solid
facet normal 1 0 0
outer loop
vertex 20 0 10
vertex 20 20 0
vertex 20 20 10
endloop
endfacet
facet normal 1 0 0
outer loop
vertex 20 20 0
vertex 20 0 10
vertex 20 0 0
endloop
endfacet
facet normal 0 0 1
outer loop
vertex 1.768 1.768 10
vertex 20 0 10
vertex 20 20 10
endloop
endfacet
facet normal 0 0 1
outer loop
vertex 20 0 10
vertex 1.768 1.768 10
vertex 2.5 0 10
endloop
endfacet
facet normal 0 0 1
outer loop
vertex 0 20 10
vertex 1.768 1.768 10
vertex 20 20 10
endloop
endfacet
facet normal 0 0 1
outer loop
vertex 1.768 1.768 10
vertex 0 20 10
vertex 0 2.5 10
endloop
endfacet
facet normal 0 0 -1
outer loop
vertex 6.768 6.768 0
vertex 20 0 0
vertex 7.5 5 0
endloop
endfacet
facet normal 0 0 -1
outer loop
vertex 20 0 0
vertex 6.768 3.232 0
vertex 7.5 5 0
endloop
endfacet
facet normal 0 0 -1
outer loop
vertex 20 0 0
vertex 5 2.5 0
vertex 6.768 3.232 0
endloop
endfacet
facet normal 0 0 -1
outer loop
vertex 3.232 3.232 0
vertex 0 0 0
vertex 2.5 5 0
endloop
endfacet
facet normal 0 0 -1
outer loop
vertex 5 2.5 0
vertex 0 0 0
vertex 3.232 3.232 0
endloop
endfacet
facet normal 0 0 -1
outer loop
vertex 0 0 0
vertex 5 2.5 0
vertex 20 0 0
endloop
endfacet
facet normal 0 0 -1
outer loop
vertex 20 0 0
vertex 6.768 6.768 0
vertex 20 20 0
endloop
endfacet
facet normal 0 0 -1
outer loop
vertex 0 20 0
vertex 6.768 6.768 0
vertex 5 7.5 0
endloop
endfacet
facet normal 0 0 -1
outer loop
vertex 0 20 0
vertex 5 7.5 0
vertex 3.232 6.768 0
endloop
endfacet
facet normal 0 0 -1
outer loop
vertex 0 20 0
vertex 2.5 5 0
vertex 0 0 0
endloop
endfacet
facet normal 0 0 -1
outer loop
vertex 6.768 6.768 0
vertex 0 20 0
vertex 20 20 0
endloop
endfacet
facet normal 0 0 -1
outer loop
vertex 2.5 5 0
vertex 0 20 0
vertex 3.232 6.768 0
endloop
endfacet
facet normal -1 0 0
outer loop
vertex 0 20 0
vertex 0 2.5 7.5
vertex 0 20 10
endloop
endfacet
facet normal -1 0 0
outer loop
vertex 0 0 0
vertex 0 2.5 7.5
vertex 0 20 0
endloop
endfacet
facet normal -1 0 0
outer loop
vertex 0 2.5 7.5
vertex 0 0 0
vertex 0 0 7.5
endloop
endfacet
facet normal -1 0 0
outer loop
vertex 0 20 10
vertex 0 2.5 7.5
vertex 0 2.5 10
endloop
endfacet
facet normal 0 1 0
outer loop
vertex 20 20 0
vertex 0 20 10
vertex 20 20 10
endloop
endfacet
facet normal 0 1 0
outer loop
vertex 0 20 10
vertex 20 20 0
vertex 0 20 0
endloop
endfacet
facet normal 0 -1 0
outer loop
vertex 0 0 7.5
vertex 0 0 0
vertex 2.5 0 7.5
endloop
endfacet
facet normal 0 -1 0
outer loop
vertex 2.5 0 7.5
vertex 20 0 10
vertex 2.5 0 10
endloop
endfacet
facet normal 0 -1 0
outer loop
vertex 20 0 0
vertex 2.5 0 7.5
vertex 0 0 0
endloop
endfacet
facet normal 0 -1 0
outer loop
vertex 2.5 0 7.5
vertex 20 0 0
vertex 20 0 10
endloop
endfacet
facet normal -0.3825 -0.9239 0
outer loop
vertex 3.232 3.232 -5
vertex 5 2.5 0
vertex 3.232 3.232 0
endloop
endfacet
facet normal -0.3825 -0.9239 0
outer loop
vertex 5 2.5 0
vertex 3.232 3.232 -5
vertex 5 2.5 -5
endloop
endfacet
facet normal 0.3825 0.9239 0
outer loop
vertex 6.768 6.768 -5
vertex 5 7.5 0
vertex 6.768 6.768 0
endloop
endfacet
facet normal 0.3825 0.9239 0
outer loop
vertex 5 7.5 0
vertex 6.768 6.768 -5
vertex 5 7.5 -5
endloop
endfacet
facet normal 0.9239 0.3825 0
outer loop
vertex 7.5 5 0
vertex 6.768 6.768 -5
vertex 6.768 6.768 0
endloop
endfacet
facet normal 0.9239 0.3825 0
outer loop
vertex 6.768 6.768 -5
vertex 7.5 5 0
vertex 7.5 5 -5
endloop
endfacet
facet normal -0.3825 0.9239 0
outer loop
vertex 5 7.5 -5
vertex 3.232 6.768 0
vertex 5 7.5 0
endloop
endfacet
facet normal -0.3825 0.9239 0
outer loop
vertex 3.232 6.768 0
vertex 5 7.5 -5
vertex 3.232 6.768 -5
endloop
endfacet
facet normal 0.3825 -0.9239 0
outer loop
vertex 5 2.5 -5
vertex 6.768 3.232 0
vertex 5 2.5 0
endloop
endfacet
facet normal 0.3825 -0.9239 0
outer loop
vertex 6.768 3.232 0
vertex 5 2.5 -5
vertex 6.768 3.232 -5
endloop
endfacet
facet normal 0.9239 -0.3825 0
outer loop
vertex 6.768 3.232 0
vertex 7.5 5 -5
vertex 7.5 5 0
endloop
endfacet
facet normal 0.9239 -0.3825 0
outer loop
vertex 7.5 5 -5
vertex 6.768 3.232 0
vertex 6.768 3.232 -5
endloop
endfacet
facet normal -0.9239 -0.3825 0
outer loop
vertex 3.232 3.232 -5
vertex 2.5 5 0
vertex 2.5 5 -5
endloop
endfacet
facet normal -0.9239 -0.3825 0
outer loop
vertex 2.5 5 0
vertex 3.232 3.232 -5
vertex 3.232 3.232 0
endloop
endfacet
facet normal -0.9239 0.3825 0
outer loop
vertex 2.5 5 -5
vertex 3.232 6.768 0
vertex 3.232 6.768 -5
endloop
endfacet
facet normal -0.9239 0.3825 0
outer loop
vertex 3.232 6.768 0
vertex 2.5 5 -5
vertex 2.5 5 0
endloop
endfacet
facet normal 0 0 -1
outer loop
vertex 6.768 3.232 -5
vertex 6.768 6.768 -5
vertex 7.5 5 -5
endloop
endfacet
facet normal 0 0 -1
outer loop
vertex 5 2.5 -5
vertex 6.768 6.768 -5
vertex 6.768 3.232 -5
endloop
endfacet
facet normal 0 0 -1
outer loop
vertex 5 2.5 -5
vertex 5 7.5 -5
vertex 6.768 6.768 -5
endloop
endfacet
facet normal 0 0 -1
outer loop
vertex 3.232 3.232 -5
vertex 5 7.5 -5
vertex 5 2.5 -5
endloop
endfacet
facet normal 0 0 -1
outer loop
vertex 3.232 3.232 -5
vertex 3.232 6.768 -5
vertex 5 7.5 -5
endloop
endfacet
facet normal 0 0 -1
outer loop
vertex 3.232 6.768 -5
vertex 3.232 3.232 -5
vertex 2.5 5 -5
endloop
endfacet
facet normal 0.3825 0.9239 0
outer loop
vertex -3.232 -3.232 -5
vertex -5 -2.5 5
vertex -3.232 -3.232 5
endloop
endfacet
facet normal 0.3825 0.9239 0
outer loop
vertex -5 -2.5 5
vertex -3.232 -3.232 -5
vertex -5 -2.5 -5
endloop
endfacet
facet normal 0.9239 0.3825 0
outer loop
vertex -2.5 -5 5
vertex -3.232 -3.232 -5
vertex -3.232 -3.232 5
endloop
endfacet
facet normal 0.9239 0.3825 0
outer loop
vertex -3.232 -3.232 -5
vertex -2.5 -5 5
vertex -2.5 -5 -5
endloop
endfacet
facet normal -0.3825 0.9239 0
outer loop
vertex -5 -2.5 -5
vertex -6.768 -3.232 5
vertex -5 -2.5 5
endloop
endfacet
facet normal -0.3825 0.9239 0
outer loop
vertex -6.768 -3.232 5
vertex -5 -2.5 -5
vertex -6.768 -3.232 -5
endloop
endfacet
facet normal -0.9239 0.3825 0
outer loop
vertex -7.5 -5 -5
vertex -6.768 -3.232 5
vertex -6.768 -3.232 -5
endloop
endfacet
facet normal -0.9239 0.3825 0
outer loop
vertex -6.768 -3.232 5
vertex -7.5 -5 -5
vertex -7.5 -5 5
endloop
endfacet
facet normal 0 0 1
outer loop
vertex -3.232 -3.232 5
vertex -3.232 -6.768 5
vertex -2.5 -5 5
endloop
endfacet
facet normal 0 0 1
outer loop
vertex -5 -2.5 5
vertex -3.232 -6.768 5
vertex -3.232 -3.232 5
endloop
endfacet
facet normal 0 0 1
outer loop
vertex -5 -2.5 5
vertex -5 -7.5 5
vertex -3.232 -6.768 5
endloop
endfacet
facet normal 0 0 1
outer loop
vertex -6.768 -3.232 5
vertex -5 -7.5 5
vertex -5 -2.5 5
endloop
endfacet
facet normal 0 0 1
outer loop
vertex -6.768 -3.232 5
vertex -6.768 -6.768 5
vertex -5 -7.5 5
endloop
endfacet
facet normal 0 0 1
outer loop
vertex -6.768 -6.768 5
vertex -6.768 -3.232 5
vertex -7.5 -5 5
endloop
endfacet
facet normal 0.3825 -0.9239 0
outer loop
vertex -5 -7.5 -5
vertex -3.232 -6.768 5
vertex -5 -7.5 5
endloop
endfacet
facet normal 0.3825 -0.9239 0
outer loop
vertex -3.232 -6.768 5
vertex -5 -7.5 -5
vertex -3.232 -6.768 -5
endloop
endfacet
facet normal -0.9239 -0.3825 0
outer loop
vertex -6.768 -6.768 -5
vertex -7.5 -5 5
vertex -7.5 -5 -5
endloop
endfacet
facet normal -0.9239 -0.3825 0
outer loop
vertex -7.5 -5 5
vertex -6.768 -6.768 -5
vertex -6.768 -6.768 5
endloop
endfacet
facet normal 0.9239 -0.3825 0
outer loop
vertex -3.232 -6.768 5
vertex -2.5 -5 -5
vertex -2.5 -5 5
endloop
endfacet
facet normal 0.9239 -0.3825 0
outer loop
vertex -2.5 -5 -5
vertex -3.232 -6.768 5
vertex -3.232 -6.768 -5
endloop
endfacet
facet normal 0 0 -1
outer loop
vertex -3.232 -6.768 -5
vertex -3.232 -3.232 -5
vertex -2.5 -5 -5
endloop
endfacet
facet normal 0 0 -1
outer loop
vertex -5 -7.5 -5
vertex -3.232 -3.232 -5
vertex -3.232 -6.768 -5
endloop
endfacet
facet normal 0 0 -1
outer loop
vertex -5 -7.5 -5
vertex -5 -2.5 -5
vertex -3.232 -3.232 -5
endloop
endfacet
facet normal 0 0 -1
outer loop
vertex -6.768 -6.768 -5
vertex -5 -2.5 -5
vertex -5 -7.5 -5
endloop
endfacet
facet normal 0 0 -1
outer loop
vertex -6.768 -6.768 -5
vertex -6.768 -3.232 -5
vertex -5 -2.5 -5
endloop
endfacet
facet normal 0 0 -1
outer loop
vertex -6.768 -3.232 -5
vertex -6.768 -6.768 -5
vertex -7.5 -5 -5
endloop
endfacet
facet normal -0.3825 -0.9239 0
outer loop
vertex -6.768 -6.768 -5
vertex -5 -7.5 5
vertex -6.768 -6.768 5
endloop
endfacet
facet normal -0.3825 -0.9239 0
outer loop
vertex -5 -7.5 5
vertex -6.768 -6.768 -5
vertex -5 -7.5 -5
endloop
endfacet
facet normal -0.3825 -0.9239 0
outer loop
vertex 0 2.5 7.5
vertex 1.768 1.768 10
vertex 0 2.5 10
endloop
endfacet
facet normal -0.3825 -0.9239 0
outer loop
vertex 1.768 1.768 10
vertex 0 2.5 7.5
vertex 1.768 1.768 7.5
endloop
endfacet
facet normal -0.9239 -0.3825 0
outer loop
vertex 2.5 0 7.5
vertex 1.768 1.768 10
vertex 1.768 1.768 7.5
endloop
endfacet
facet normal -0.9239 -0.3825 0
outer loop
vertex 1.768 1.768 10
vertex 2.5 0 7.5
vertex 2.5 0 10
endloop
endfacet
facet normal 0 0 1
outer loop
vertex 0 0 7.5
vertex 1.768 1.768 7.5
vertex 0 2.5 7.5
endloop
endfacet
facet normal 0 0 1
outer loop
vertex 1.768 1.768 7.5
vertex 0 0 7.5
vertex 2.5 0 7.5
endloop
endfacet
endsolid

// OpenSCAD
difference() {
    union() {
        cube([20, 20, 10]);
        translate([5, 5, 0])
            cylinder(h = 10, r = 2.5, center = true);
        translate([-5, -5, 0])
            cylinder(h = 10, r = 2.5, center = true);
    }
    translate([0, 0, 10])
        cylinder(h = 5, r = 2.5, center = true);
}
